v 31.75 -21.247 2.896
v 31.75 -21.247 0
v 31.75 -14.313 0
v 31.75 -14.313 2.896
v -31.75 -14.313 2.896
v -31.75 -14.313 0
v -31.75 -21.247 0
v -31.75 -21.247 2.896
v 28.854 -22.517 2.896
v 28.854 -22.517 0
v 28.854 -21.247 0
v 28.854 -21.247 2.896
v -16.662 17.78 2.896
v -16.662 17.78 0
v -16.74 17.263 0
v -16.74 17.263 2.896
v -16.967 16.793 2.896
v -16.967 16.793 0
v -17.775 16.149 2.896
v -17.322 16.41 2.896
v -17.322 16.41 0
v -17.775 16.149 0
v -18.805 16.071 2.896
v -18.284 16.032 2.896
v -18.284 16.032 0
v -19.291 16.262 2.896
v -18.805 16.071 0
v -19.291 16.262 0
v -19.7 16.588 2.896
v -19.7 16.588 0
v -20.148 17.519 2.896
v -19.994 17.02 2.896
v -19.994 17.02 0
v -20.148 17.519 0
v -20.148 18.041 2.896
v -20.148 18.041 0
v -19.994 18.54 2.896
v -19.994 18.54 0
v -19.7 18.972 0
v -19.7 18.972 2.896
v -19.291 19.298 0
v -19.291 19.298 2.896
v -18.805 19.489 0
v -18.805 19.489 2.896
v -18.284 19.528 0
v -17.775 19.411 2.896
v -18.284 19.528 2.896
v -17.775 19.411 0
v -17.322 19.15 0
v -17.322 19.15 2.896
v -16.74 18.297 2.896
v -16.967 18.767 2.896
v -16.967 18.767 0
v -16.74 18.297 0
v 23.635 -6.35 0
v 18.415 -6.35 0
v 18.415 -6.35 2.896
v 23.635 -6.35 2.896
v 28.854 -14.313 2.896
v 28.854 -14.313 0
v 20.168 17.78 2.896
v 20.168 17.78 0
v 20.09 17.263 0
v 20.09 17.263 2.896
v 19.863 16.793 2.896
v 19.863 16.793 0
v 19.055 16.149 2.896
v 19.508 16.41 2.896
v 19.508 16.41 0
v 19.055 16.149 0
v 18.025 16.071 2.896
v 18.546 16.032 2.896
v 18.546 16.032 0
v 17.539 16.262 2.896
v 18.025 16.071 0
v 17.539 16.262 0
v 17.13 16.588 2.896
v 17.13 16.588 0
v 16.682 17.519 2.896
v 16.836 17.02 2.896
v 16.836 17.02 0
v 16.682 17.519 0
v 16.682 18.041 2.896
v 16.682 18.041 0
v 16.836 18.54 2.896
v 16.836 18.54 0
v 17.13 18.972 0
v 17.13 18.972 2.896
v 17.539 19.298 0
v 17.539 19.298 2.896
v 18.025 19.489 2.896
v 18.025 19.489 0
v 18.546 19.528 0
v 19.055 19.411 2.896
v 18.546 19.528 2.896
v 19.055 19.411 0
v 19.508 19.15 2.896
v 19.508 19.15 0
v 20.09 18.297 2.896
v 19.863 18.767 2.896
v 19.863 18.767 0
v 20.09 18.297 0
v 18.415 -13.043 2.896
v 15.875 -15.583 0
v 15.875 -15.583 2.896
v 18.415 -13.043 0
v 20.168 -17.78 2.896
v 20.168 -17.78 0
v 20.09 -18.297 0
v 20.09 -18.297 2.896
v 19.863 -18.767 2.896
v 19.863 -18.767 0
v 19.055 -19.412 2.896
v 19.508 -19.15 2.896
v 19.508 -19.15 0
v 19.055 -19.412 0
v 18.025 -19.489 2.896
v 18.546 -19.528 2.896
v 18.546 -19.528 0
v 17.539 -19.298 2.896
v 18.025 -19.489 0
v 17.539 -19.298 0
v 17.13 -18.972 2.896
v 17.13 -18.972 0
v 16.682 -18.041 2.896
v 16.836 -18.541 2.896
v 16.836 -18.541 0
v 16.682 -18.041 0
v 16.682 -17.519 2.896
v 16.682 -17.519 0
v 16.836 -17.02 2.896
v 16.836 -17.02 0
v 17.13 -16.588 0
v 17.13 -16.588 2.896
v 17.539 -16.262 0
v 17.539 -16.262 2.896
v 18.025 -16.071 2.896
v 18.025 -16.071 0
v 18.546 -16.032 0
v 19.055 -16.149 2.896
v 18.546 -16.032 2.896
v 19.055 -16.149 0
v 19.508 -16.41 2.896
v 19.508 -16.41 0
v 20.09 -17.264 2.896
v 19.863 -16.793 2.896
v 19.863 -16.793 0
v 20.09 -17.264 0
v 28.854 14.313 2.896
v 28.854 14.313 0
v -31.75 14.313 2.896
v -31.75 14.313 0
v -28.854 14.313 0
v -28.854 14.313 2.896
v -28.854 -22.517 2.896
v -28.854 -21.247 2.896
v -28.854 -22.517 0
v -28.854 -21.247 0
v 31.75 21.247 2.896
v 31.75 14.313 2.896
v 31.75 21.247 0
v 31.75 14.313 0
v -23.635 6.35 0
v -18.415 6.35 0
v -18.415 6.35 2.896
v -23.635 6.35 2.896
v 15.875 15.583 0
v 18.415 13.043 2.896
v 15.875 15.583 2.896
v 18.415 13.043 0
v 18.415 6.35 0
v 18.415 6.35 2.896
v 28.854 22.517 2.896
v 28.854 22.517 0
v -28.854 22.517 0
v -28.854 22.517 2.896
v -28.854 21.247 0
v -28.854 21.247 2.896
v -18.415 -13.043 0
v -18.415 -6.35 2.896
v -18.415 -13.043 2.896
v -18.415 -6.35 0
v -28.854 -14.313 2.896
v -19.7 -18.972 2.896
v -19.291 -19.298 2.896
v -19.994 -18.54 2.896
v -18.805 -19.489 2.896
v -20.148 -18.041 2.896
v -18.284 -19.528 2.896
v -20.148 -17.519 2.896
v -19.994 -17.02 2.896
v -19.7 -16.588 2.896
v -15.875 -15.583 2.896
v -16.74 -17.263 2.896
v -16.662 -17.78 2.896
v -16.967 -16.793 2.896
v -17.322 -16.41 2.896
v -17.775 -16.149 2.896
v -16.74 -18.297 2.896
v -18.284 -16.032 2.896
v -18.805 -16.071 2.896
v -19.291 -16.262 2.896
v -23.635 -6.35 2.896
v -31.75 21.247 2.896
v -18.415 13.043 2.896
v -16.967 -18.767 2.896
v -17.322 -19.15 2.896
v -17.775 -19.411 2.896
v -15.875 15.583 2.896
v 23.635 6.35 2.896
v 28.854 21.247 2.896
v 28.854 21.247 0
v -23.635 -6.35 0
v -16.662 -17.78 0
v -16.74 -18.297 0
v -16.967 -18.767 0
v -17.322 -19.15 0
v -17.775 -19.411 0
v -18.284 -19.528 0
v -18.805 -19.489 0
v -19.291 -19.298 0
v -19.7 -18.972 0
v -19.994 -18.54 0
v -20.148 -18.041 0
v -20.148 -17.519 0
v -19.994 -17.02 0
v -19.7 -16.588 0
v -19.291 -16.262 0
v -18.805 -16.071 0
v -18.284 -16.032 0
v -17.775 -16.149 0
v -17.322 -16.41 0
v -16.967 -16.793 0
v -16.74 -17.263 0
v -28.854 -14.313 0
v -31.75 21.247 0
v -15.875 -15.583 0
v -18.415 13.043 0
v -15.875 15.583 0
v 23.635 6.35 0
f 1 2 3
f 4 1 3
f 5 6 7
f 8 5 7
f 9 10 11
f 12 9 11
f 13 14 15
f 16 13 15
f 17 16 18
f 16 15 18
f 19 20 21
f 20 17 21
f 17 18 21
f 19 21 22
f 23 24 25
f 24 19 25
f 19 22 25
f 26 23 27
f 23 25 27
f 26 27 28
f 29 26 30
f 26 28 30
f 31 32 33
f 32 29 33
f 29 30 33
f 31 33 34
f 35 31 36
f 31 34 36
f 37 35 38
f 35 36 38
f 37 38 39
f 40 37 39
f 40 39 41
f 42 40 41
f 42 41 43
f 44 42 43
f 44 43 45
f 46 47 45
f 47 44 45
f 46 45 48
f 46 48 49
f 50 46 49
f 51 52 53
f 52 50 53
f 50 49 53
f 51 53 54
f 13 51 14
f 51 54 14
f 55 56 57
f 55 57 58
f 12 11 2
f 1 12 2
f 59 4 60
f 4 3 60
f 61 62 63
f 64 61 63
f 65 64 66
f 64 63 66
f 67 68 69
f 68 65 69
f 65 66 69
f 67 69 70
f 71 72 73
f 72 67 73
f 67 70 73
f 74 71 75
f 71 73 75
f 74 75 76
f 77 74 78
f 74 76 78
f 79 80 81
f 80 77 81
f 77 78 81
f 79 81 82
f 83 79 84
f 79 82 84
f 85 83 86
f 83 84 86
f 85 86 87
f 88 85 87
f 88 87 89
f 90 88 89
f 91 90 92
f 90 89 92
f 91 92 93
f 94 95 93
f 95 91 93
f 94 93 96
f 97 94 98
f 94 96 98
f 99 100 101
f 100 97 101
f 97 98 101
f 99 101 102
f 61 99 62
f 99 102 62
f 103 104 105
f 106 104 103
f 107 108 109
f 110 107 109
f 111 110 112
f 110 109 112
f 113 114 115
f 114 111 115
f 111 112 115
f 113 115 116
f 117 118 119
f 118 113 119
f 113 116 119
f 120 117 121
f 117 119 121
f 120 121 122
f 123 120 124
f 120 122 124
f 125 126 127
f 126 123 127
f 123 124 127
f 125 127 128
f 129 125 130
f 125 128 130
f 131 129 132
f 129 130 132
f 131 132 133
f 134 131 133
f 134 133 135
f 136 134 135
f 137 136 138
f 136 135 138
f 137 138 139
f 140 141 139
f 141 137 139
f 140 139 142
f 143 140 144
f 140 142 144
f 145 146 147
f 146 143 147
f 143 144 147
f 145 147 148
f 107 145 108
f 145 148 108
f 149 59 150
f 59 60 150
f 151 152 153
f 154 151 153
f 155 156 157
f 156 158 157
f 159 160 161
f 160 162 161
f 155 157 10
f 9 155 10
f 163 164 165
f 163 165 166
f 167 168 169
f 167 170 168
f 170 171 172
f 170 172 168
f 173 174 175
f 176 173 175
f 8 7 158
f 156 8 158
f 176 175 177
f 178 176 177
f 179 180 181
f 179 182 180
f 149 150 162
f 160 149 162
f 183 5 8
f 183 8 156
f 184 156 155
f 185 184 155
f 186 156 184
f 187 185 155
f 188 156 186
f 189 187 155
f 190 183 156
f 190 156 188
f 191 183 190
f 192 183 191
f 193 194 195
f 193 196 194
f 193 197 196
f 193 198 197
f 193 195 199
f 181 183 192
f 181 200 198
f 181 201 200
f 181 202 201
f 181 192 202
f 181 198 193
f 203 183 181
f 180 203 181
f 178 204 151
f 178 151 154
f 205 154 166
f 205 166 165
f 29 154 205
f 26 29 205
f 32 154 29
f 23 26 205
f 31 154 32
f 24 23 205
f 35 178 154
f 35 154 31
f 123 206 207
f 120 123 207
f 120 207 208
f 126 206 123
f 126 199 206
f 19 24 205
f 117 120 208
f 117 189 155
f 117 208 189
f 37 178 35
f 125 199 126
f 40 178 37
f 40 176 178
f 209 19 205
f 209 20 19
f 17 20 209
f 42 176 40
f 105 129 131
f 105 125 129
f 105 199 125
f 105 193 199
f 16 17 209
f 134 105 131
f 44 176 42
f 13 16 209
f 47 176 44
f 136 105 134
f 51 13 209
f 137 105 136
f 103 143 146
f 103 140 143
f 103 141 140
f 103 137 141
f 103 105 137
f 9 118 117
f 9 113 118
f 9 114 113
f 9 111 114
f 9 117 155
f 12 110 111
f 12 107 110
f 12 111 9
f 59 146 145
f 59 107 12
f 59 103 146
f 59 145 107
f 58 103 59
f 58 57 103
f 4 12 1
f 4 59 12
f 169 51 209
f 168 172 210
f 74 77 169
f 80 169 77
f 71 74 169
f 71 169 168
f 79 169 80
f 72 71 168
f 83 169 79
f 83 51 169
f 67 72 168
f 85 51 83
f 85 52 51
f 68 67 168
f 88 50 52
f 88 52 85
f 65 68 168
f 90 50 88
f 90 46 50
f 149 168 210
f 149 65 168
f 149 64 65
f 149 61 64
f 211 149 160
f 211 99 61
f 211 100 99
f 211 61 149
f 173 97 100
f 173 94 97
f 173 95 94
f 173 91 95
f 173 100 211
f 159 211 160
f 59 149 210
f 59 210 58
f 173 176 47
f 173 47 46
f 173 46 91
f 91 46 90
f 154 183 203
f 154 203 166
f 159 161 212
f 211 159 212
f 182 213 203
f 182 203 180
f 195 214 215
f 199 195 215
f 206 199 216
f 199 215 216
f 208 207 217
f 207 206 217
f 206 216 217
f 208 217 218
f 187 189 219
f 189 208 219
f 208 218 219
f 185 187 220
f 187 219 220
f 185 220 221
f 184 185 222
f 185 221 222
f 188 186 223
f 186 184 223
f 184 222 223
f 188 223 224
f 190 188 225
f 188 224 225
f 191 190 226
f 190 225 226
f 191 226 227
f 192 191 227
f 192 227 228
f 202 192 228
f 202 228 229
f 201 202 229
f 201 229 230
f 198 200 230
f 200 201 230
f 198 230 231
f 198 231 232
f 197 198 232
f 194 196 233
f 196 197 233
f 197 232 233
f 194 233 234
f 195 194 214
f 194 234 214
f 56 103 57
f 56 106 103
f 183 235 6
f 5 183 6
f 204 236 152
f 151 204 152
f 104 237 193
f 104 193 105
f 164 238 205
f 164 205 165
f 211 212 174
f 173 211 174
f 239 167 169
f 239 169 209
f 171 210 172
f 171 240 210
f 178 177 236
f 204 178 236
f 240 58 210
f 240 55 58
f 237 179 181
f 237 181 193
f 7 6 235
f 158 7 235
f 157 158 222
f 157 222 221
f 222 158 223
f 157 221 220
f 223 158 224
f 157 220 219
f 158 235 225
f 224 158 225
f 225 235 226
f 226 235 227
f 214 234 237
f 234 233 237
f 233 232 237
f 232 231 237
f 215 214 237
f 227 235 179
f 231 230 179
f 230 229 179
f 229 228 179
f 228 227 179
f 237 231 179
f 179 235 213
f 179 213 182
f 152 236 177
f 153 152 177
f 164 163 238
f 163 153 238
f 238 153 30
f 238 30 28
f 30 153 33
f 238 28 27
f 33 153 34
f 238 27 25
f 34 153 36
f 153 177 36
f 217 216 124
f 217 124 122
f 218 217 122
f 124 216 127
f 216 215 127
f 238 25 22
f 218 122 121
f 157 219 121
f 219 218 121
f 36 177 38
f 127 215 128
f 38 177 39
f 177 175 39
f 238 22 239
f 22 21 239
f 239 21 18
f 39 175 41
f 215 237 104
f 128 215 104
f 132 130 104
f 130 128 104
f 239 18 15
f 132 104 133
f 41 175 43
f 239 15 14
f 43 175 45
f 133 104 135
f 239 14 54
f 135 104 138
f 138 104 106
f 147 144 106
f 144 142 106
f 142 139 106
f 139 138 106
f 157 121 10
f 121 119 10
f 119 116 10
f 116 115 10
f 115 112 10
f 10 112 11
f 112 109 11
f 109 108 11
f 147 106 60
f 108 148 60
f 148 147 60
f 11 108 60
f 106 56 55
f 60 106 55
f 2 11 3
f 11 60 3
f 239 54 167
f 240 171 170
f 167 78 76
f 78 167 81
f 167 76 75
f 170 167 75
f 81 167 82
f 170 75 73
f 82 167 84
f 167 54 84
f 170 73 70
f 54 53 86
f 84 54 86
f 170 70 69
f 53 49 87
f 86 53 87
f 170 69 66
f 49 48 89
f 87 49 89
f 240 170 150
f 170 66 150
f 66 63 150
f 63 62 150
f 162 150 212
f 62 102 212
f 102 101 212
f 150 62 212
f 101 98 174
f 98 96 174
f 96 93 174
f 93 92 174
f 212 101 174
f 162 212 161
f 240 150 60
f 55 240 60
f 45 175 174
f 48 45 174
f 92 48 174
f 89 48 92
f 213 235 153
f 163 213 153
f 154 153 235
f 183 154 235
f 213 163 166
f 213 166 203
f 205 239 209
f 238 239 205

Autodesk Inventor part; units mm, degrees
ref_plane "YZ Plane" through (0, 0, 0) normal (1, 0, 0) x (0, 1, 0)
ref_plane "XZ Plane" through (0, 0, 0) normal (0, 1, 0) x (-1, 0, 0)
ref_plane "XY Plane" through (0, 0, 0) normal (0, 0, 1) x (1, 0, 0)
sketch "Sketch1" plane through (0, 0, 0) normal (0, 0, 1) x (1, 0, 0)
  line L0 (-31.75, -21.2471) -> (-28.8544, -21.2471)
  line L1 (-28.8544, -21.2471) -> (-28.8544, -22.5171)
  line L2 (-28.8544, -22.5171) -> (28.8544, -22.5171)
  line L3 (28.8544, -22.5171) -> (28.8544, -21.2471)
  line L4 (28.8544, -21.2471) -> (31.75, -21.2471)
  line L5 (31.75, -21.2471) -> (31.75, -14.3129)
  line L6 (31.75, -14.3129) -> (28.8544, -14.3129)
  line L7 (28.8544, -14.3129) -> (28.8544, 14.3129)
  line L8 (28.8544, 14.3129) -> (31.75, 14.3129)
  line L9 (31.75, 14.3129) -> (31.75, 21.2471)
  line L10 (31.75, 21.2471) -> (28.8544, 21.2471)
  line L11 (28.8544, 21.2471) -> (28.8544, 22.5171)
  line L12 (28.8544, 22.5171) -> (-28.8544, 22.5171)
  line L13 (-28.8544, 22.5171) -> (-28.8544, 21.2471)
  line L14 (-28.8544, 21.2471) -> (-31.75, 21.2471)
  line L15 (-31.75, 21.2471) -> (-31.75, 14.3129)
  line L16 (-31.75, 14.3129) -> (-28.8544, 14.3129)
  line L17 (-28.8544, 14.3129) -> (-28.8544, -14.3129)
  line L18 (-28.8544, -14.3129) -> (-31.75, -14.3129)
  line L19 (-31.75, -14.3129) -> (-31.75, -21.2471)
  line L20 (18.415, -6.35) -> (23.6347, -6.35)
  line L21 (23.6347, -6.35) -> (23.6347, 6.35)
  line L22 (23.6347, 6.35) -> (18.415, 6.35)
  line L23 (18.415, 6.35) -> (18.415, 13.0429)
  line L24 (18.415, 13.0429) -> (15.875, 15.5829)
  line L25 (15.875, 15.5829) -> (-15.875, 15.5829)
  line L26 (-15.875, 15.5829) -> (-18.415, 13.0429)
  line L27 (-18.415, 13.0429) -> (-18.415, 6.35)
  line L28 (-18.415, 6.35) -> (-23.6347, 6.35)
  line L29 (-23.6347, 6.35) -> (-23.6347, -6.35)
  line L30 (-23.6347, -6.35) -> (-18.415, -6.35)
  line L31 (-18.415, -6.35) -> (-18.415, -13.0429)
  line L32 (-18.415, -13.0429) -> (-15.875, -15.5829)
  line L33 (-15.875, -15.5829) -> (15.875, -15.5829)
  line L34 (15.875, -15.5829) -> (18.415, -13.0429)
  line L35 (18.415, -13.0429) -> (18.415, -6.35)
  circle A0 centre (18.4151, -17.7801) radius 1.7526
  circle A1 centre (-18.415, 17.78) radius 1.7526
  circle A2 centre (-18.415, -17.78) radius 1.7526
  circle A3 centre (18.415, 17.78) radius 1.7526
extrude "Extrusion1" add sketch "Sketch1" along normal blind 2.8956
properties part number "pcb_mount" material "Polycarbonate, Clear"
